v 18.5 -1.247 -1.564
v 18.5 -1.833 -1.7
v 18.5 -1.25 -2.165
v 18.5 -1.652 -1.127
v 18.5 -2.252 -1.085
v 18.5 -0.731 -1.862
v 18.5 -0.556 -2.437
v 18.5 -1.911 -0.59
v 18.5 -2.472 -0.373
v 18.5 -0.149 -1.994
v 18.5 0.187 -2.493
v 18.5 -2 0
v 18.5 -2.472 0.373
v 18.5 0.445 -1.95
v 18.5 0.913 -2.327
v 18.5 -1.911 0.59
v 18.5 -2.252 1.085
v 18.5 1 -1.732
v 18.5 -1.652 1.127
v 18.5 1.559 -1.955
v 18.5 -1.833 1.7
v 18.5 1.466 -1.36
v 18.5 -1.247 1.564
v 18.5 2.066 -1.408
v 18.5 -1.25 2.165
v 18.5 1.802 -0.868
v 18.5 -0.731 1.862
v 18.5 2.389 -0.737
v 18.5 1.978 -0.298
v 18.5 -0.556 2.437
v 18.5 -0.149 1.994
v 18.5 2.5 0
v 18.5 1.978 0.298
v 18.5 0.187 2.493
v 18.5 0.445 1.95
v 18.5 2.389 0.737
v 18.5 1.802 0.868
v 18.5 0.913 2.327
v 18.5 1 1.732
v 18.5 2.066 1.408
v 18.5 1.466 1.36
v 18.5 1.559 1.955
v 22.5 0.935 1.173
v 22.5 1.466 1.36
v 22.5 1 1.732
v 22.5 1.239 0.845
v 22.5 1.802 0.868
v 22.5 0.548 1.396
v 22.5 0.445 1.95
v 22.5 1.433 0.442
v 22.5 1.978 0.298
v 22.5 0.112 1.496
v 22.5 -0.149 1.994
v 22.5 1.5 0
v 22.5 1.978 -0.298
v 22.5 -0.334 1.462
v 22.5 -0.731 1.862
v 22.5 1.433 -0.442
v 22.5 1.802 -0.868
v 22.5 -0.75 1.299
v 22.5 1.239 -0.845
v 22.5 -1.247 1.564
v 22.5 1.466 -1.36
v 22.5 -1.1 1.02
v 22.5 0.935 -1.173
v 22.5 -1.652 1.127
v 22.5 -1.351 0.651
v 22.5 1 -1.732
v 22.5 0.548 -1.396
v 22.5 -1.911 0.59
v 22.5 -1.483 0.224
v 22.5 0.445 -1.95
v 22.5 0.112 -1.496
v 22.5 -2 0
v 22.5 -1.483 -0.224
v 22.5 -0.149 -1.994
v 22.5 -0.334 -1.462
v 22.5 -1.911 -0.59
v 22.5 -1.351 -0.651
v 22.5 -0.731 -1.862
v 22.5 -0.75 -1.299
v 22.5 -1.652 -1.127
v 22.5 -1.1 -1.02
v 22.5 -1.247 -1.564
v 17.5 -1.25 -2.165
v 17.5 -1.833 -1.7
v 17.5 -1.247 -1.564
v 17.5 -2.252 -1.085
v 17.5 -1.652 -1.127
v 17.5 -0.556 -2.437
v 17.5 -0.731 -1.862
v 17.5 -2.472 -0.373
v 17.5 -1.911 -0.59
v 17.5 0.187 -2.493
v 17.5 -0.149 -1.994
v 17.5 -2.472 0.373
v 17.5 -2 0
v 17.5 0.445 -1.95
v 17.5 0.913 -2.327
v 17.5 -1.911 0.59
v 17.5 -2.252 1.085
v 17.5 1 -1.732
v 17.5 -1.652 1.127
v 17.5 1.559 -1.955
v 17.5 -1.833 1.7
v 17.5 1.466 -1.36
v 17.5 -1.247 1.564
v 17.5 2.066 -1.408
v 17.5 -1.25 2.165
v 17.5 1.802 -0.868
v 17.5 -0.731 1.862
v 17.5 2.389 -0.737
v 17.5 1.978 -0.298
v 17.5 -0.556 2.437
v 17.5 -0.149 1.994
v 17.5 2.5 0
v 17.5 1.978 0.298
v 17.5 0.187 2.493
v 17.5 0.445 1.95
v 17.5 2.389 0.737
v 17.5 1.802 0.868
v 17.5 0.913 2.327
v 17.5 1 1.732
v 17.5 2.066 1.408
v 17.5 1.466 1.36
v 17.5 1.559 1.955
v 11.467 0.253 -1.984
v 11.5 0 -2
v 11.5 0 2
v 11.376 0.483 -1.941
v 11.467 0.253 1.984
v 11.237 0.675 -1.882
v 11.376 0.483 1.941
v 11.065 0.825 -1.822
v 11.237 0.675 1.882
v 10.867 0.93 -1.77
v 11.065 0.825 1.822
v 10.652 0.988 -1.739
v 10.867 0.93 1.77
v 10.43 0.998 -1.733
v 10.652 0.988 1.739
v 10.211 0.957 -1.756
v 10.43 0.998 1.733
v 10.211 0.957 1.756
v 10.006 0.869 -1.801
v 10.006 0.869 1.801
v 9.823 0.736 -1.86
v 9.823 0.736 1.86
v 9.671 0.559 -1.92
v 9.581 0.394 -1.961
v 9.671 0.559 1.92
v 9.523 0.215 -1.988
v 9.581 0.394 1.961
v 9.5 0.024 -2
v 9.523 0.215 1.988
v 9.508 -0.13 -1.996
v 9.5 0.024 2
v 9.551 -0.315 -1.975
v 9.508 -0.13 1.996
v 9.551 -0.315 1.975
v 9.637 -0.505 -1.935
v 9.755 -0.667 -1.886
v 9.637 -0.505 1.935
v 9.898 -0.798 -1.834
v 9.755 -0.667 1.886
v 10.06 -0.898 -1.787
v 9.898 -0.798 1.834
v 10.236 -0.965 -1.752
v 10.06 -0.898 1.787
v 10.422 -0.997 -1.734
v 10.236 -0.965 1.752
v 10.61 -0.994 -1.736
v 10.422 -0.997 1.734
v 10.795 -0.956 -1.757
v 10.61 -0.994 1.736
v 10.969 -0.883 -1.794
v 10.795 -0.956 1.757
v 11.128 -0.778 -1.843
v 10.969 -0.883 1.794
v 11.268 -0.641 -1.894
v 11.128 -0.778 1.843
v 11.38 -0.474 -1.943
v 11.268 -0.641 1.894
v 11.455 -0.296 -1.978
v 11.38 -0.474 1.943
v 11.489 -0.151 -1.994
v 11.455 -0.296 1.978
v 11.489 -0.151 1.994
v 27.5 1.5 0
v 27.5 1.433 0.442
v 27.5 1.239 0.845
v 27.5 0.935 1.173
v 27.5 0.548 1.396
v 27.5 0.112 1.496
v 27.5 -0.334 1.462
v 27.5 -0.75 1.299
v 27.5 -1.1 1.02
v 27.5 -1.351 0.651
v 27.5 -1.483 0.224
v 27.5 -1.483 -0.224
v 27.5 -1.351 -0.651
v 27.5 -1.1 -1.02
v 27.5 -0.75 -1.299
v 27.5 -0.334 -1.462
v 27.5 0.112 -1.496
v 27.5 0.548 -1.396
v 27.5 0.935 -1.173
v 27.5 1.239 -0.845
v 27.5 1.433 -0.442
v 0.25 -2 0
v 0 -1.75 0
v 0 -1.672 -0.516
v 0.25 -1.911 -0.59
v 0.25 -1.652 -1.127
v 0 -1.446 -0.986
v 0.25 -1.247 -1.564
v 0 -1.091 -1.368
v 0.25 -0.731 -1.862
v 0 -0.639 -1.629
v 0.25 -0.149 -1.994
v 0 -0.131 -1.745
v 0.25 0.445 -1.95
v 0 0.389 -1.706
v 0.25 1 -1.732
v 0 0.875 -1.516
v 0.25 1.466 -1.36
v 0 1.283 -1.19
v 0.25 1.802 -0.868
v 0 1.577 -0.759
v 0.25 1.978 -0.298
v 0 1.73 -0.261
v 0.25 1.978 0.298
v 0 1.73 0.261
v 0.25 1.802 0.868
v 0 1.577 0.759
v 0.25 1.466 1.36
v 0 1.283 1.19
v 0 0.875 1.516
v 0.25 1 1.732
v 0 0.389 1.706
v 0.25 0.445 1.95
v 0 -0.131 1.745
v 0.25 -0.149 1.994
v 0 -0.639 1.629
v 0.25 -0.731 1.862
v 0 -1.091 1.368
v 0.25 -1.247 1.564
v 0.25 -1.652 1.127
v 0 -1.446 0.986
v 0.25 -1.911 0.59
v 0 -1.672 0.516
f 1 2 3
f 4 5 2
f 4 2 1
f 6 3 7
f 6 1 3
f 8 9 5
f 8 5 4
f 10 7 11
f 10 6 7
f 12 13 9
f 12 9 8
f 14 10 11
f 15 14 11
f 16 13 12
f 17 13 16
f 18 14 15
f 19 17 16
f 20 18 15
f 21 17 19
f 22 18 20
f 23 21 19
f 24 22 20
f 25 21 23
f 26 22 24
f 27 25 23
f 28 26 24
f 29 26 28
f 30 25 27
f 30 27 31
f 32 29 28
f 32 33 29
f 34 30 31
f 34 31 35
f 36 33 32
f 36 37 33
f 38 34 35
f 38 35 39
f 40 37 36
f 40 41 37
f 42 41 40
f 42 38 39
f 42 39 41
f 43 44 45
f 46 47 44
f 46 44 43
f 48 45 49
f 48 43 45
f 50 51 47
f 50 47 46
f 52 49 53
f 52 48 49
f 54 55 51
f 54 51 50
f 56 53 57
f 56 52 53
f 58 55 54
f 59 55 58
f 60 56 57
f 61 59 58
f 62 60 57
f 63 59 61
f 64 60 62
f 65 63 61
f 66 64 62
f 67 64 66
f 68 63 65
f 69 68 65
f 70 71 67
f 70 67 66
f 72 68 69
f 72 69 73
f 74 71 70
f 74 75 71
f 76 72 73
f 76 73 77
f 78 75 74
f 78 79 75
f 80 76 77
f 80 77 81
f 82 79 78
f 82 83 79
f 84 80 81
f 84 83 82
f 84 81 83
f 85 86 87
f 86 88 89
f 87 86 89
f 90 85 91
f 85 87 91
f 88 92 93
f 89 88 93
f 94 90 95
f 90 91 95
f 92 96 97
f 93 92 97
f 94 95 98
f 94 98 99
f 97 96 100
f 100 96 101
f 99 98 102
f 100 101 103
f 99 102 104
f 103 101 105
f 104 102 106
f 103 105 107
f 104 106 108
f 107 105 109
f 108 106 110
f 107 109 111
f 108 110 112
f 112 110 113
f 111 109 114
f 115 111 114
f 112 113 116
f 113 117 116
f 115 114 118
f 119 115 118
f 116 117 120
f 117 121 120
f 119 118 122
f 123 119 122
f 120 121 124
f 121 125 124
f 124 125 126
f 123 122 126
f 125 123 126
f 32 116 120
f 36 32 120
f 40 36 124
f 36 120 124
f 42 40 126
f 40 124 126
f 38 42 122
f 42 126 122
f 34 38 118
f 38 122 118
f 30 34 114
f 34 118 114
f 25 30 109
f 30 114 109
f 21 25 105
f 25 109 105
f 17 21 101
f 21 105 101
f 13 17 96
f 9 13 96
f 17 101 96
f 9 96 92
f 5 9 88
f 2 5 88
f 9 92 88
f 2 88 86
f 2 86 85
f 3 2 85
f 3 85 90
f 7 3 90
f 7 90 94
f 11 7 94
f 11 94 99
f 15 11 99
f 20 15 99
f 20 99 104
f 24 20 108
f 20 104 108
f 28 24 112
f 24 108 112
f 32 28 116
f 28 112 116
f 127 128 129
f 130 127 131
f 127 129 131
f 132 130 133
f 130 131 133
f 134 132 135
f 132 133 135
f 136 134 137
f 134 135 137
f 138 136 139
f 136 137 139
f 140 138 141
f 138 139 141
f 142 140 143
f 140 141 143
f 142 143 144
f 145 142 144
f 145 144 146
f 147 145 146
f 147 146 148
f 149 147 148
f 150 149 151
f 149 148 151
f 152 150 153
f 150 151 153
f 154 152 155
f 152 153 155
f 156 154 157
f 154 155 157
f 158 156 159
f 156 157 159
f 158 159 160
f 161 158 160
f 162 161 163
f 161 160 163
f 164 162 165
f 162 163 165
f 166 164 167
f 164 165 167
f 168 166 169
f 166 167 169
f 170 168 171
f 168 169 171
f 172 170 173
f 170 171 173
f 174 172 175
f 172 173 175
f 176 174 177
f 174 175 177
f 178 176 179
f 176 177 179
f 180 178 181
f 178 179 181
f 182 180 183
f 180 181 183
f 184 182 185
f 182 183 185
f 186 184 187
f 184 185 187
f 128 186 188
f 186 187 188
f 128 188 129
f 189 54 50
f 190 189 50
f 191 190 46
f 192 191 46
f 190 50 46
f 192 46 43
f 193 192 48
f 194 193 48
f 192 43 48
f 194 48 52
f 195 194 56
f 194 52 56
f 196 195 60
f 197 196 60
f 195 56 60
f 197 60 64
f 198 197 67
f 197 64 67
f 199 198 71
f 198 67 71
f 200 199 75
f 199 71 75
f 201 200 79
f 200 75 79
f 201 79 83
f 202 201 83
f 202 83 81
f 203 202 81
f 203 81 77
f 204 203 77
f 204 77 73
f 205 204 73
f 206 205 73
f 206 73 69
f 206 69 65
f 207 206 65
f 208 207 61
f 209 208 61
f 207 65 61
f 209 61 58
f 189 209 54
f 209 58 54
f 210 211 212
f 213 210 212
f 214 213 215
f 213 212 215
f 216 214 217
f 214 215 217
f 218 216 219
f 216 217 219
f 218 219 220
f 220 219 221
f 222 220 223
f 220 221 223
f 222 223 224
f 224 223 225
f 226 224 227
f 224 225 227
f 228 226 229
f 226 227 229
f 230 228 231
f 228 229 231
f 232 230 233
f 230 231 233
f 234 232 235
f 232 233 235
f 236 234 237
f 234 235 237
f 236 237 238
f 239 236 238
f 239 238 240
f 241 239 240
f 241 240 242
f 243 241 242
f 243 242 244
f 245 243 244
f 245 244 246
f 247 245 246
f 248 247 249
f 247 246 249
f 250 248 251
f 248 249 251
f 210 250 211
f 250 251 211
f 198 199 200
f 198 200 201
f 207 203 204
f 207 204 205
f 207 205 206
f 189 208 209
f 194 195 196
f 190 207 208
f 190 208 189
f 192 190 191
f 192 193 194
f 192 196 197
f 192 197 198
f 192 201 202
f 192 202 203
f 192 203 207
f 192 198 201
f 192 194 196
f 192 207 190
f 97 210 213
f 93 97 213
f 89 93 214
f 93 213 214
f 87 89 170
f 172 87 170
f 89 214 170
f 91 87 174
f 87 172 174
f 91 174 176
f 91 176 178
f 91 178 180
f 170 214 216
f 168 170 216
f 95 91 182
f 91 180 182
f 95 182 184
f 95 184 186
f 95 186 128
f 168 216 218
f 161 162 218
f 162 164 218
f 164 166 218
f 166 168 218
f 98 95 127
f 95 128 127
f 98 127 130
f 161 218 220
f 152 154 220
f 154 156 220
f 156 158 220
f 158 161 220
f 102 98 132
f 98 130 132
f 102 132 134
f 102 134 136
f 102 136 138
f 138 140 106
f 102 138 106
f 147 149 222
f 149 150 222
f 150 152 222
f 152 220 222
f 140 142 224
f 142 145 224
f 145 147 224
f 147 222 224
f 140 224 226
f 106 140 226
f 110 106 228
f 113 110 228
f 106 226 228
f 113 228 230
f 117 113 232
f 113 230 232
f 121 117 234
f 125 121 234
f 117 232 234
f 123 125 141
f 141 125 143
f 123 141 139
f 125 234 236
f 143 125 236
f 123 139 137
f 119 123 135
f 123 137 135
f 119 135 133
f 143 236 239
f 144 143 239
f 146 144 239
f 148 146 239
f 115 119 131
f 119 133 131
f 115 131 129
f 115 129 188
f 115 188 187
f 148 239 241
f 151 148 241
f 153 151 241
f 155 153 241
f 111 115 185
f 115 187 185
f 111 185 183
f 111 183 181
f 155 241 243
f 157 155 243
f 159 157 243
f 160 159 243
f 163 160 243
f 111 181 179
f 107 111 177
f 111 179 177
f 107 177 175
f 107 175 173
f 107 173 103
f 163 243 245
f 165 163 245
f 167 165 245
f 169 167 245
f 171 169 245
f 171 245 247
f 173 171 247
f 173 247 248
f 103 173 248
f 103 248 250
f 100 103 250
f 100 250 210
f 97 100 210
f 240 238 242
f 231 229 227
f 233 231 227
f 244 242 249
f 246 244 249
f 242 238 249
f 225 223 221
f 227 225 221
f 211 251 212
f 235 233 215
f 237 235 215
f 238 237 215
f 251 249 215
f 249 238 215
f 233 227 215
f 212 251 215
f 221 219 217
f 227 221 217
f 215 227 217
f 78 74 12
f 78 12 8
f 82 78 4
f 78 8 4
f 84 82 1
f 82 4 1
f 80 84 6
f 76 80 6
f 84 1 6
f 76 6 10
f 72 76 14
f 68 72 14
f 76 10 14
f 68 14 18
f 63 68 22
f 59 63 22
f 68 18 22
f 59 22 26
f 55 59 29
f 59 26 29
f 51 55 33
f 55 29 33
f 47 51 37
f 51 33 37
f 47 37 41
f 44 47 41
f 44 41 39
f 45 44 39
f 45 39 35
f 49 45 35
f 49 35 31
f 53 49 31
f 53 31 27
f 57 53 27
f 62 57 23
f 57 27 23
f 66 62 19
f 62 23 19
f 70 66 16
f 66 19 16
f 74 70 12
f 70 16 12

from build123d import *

# Parameters (mm, degrees)
CUT_EXTRUDE_START   = -3.5
CUT_EXTRUDE_1_DEPTH = 10
SKETCH_3_W          = 4
SKETCH_3_H          = 19.670556204
CUT_EXTRUDE_2_DEPTH = 10
CUT_EXTRUDE_START_2 = -29
SKETCH_4_R          = 4
SKETCH_4_R_2        = 2
CUT_EXTRUDE_3_DEPTH = 29
SKETCH_5_R          = 1
CUT_EXTRUDE_4_DEPTH = 5
SKETCH_6_R          = 2
EXTRUDE_1_DEPTH     = 1
EXTRUDE_START       = -4.5
SKETCH_7_R          = 2.5
SKETCH_7_R_2        = 2
EXTRUDE_2_DEPTH     = 1
CHAMFER_2_SIZE      = 0.25
SKETCH_8_R          = 2
EXTRUDE_3_DEPTH     = 0.5
SKETCH_11_R         = 1.5
EXTRUDE_4_DEPTH     = 5


with BuildPart() as part:
    # 草图1 → 旋转2 (revolve)
    with BuildSketch(Plane.XY, mode=Mode.PRIVATE) as revolve_2_sk:
        Polygon((0, 2), (0, 0), (17, 0), (21, 0), (21, 2), (17, 2), (17, 4), (4, 4), (4, 2), align=None)
    revolve(revolve_2_sk.sketch.rotate(Axis((-16.701754386, 0, 0), (1, 0, 0)), 180), axis=Axis((-16.701754386, 0, 0), (1, 0, 0)))

    # 草图2 → 切除-拉伸1 (cut)
    with BuildSketch(Plane.XY.offset(CUT_EXTRUDE_START)):
        Polygon((12.5, -5.827233832), (12.5, 4), (10.5, 4), (8.5, 4), (8.5, -5.827233832), align=None)
    extrude(amount=-CUT_EXTRUDE_1_DEPTH, mode=Mode.SUBTRACT)

    # 草图3 → 切除-拉伸2 (cut)
    with BuildSketch(Plane(origin=(0, 0, 0), x_dir=(1, 0, 0), z_dir=(0, 1, 0)).offset(CUT_EXTRUDE_START)):
        with Locations((10.5, 3.5)):
            Rectangle(SKETCH_3_W, SKETCH_3_H)
    extrude(amount=-CUT_EXTRUDE_2_DEPTH, mode=Mode.SUBTRACT)

    # 草图4 → 切除-拉伸3 (cut)
    with BuildSketch(Plane(origin=(21, 0, 0), x_dir=(0, 0, -1), z_dir=(1, 0, 0)).offset(CUT_EXTRUDE_START_2)):
        Circle(SKETCH_4_R)
        with Locations(Location((0, 0, 0), (0, 0, 270))):
            Circle(SKETCH_4_R_2, mode=Mode.SUBTRACT)
    extrude(amount=CUT_EXTRUDE_3_DEPTH, mode=Mode.SUBTRACT)

    # 草图5 → 切除-拉伸4 (cut, symmetric)
    with BuildSketch(Plane.XY):
        with Locations((10.5, 0)):
            Circle(SKETCH_5_R)
    extrude(amount=CUT_EXTRUDE_4_DEPTH, both=True, mode=Mode.SUBTRACT)

    # 草图6 → 凸台-拉伸1 (add)
    with BuildSketch(Plane(origin=(21, 0, 0), x_dir=(0, 0, -1), z_dir=(1, 0, 0))):
        with Locations(Location((0, 0, 0), (0, 0, 270))):
            Circle(SKETCH_6_R)
    extrude(amount=EXTRUDE_1_DEPTH)

    # 草图7 → 凸台-拉伸2 (add)
    with BuildSketch(Plane(origin=(22, 0, 0), x_dir=(0, 0, -1), z_dir=(1, 0, 0)).offset(EXTRUDE_START)):
        with Locations(Location((0, 0, 0), (0, 0, 90))):
            Circle(SKETCH_7_R)
        with Locations(Location((0, 0, 0), (0, 0, 270))):
            Circle(SKETCH_7_R_2, mode=Mode.SUBTRACT)
    extrude(amount=EXTRUDE_2_DEPTH)

    # 倒角2
    chamfer_2_edges = [part.edges().sort_by_distance(p)[0] for p in [
        (0, 2, 0),
    ]]
    chamfer(chamfer_2_edges, length=CHAMFER_2_SIZE)

    # 草图8 → 凸台-拉伸3 (add)
    with BuildSketch(Plane(origin=(22, 0, 0), x_dir=(0, 0, -1), z_dir=(1, 0, 0))):
        with Locations(Location((0, 0, 0), (0, 0, 270))):
            Circle(SKETCH_8_R)
    extrude(amount=EXTRUDE_3_DEPTH)

    # 草图11 → 凸台-拉伸4 (add)
    with BuildSketch(Plane(origin=(22.5, 0, 0), x_dir=(0, 0, -1), z_dir=(1, 0, 0))):
        with Locations(Location((0, 0, 0), (0, 0, 90))):
            Circle(SKETCH_11_R)
    extrude(amount=EXTRUDE_4_DEPTH)


solid = part.part
